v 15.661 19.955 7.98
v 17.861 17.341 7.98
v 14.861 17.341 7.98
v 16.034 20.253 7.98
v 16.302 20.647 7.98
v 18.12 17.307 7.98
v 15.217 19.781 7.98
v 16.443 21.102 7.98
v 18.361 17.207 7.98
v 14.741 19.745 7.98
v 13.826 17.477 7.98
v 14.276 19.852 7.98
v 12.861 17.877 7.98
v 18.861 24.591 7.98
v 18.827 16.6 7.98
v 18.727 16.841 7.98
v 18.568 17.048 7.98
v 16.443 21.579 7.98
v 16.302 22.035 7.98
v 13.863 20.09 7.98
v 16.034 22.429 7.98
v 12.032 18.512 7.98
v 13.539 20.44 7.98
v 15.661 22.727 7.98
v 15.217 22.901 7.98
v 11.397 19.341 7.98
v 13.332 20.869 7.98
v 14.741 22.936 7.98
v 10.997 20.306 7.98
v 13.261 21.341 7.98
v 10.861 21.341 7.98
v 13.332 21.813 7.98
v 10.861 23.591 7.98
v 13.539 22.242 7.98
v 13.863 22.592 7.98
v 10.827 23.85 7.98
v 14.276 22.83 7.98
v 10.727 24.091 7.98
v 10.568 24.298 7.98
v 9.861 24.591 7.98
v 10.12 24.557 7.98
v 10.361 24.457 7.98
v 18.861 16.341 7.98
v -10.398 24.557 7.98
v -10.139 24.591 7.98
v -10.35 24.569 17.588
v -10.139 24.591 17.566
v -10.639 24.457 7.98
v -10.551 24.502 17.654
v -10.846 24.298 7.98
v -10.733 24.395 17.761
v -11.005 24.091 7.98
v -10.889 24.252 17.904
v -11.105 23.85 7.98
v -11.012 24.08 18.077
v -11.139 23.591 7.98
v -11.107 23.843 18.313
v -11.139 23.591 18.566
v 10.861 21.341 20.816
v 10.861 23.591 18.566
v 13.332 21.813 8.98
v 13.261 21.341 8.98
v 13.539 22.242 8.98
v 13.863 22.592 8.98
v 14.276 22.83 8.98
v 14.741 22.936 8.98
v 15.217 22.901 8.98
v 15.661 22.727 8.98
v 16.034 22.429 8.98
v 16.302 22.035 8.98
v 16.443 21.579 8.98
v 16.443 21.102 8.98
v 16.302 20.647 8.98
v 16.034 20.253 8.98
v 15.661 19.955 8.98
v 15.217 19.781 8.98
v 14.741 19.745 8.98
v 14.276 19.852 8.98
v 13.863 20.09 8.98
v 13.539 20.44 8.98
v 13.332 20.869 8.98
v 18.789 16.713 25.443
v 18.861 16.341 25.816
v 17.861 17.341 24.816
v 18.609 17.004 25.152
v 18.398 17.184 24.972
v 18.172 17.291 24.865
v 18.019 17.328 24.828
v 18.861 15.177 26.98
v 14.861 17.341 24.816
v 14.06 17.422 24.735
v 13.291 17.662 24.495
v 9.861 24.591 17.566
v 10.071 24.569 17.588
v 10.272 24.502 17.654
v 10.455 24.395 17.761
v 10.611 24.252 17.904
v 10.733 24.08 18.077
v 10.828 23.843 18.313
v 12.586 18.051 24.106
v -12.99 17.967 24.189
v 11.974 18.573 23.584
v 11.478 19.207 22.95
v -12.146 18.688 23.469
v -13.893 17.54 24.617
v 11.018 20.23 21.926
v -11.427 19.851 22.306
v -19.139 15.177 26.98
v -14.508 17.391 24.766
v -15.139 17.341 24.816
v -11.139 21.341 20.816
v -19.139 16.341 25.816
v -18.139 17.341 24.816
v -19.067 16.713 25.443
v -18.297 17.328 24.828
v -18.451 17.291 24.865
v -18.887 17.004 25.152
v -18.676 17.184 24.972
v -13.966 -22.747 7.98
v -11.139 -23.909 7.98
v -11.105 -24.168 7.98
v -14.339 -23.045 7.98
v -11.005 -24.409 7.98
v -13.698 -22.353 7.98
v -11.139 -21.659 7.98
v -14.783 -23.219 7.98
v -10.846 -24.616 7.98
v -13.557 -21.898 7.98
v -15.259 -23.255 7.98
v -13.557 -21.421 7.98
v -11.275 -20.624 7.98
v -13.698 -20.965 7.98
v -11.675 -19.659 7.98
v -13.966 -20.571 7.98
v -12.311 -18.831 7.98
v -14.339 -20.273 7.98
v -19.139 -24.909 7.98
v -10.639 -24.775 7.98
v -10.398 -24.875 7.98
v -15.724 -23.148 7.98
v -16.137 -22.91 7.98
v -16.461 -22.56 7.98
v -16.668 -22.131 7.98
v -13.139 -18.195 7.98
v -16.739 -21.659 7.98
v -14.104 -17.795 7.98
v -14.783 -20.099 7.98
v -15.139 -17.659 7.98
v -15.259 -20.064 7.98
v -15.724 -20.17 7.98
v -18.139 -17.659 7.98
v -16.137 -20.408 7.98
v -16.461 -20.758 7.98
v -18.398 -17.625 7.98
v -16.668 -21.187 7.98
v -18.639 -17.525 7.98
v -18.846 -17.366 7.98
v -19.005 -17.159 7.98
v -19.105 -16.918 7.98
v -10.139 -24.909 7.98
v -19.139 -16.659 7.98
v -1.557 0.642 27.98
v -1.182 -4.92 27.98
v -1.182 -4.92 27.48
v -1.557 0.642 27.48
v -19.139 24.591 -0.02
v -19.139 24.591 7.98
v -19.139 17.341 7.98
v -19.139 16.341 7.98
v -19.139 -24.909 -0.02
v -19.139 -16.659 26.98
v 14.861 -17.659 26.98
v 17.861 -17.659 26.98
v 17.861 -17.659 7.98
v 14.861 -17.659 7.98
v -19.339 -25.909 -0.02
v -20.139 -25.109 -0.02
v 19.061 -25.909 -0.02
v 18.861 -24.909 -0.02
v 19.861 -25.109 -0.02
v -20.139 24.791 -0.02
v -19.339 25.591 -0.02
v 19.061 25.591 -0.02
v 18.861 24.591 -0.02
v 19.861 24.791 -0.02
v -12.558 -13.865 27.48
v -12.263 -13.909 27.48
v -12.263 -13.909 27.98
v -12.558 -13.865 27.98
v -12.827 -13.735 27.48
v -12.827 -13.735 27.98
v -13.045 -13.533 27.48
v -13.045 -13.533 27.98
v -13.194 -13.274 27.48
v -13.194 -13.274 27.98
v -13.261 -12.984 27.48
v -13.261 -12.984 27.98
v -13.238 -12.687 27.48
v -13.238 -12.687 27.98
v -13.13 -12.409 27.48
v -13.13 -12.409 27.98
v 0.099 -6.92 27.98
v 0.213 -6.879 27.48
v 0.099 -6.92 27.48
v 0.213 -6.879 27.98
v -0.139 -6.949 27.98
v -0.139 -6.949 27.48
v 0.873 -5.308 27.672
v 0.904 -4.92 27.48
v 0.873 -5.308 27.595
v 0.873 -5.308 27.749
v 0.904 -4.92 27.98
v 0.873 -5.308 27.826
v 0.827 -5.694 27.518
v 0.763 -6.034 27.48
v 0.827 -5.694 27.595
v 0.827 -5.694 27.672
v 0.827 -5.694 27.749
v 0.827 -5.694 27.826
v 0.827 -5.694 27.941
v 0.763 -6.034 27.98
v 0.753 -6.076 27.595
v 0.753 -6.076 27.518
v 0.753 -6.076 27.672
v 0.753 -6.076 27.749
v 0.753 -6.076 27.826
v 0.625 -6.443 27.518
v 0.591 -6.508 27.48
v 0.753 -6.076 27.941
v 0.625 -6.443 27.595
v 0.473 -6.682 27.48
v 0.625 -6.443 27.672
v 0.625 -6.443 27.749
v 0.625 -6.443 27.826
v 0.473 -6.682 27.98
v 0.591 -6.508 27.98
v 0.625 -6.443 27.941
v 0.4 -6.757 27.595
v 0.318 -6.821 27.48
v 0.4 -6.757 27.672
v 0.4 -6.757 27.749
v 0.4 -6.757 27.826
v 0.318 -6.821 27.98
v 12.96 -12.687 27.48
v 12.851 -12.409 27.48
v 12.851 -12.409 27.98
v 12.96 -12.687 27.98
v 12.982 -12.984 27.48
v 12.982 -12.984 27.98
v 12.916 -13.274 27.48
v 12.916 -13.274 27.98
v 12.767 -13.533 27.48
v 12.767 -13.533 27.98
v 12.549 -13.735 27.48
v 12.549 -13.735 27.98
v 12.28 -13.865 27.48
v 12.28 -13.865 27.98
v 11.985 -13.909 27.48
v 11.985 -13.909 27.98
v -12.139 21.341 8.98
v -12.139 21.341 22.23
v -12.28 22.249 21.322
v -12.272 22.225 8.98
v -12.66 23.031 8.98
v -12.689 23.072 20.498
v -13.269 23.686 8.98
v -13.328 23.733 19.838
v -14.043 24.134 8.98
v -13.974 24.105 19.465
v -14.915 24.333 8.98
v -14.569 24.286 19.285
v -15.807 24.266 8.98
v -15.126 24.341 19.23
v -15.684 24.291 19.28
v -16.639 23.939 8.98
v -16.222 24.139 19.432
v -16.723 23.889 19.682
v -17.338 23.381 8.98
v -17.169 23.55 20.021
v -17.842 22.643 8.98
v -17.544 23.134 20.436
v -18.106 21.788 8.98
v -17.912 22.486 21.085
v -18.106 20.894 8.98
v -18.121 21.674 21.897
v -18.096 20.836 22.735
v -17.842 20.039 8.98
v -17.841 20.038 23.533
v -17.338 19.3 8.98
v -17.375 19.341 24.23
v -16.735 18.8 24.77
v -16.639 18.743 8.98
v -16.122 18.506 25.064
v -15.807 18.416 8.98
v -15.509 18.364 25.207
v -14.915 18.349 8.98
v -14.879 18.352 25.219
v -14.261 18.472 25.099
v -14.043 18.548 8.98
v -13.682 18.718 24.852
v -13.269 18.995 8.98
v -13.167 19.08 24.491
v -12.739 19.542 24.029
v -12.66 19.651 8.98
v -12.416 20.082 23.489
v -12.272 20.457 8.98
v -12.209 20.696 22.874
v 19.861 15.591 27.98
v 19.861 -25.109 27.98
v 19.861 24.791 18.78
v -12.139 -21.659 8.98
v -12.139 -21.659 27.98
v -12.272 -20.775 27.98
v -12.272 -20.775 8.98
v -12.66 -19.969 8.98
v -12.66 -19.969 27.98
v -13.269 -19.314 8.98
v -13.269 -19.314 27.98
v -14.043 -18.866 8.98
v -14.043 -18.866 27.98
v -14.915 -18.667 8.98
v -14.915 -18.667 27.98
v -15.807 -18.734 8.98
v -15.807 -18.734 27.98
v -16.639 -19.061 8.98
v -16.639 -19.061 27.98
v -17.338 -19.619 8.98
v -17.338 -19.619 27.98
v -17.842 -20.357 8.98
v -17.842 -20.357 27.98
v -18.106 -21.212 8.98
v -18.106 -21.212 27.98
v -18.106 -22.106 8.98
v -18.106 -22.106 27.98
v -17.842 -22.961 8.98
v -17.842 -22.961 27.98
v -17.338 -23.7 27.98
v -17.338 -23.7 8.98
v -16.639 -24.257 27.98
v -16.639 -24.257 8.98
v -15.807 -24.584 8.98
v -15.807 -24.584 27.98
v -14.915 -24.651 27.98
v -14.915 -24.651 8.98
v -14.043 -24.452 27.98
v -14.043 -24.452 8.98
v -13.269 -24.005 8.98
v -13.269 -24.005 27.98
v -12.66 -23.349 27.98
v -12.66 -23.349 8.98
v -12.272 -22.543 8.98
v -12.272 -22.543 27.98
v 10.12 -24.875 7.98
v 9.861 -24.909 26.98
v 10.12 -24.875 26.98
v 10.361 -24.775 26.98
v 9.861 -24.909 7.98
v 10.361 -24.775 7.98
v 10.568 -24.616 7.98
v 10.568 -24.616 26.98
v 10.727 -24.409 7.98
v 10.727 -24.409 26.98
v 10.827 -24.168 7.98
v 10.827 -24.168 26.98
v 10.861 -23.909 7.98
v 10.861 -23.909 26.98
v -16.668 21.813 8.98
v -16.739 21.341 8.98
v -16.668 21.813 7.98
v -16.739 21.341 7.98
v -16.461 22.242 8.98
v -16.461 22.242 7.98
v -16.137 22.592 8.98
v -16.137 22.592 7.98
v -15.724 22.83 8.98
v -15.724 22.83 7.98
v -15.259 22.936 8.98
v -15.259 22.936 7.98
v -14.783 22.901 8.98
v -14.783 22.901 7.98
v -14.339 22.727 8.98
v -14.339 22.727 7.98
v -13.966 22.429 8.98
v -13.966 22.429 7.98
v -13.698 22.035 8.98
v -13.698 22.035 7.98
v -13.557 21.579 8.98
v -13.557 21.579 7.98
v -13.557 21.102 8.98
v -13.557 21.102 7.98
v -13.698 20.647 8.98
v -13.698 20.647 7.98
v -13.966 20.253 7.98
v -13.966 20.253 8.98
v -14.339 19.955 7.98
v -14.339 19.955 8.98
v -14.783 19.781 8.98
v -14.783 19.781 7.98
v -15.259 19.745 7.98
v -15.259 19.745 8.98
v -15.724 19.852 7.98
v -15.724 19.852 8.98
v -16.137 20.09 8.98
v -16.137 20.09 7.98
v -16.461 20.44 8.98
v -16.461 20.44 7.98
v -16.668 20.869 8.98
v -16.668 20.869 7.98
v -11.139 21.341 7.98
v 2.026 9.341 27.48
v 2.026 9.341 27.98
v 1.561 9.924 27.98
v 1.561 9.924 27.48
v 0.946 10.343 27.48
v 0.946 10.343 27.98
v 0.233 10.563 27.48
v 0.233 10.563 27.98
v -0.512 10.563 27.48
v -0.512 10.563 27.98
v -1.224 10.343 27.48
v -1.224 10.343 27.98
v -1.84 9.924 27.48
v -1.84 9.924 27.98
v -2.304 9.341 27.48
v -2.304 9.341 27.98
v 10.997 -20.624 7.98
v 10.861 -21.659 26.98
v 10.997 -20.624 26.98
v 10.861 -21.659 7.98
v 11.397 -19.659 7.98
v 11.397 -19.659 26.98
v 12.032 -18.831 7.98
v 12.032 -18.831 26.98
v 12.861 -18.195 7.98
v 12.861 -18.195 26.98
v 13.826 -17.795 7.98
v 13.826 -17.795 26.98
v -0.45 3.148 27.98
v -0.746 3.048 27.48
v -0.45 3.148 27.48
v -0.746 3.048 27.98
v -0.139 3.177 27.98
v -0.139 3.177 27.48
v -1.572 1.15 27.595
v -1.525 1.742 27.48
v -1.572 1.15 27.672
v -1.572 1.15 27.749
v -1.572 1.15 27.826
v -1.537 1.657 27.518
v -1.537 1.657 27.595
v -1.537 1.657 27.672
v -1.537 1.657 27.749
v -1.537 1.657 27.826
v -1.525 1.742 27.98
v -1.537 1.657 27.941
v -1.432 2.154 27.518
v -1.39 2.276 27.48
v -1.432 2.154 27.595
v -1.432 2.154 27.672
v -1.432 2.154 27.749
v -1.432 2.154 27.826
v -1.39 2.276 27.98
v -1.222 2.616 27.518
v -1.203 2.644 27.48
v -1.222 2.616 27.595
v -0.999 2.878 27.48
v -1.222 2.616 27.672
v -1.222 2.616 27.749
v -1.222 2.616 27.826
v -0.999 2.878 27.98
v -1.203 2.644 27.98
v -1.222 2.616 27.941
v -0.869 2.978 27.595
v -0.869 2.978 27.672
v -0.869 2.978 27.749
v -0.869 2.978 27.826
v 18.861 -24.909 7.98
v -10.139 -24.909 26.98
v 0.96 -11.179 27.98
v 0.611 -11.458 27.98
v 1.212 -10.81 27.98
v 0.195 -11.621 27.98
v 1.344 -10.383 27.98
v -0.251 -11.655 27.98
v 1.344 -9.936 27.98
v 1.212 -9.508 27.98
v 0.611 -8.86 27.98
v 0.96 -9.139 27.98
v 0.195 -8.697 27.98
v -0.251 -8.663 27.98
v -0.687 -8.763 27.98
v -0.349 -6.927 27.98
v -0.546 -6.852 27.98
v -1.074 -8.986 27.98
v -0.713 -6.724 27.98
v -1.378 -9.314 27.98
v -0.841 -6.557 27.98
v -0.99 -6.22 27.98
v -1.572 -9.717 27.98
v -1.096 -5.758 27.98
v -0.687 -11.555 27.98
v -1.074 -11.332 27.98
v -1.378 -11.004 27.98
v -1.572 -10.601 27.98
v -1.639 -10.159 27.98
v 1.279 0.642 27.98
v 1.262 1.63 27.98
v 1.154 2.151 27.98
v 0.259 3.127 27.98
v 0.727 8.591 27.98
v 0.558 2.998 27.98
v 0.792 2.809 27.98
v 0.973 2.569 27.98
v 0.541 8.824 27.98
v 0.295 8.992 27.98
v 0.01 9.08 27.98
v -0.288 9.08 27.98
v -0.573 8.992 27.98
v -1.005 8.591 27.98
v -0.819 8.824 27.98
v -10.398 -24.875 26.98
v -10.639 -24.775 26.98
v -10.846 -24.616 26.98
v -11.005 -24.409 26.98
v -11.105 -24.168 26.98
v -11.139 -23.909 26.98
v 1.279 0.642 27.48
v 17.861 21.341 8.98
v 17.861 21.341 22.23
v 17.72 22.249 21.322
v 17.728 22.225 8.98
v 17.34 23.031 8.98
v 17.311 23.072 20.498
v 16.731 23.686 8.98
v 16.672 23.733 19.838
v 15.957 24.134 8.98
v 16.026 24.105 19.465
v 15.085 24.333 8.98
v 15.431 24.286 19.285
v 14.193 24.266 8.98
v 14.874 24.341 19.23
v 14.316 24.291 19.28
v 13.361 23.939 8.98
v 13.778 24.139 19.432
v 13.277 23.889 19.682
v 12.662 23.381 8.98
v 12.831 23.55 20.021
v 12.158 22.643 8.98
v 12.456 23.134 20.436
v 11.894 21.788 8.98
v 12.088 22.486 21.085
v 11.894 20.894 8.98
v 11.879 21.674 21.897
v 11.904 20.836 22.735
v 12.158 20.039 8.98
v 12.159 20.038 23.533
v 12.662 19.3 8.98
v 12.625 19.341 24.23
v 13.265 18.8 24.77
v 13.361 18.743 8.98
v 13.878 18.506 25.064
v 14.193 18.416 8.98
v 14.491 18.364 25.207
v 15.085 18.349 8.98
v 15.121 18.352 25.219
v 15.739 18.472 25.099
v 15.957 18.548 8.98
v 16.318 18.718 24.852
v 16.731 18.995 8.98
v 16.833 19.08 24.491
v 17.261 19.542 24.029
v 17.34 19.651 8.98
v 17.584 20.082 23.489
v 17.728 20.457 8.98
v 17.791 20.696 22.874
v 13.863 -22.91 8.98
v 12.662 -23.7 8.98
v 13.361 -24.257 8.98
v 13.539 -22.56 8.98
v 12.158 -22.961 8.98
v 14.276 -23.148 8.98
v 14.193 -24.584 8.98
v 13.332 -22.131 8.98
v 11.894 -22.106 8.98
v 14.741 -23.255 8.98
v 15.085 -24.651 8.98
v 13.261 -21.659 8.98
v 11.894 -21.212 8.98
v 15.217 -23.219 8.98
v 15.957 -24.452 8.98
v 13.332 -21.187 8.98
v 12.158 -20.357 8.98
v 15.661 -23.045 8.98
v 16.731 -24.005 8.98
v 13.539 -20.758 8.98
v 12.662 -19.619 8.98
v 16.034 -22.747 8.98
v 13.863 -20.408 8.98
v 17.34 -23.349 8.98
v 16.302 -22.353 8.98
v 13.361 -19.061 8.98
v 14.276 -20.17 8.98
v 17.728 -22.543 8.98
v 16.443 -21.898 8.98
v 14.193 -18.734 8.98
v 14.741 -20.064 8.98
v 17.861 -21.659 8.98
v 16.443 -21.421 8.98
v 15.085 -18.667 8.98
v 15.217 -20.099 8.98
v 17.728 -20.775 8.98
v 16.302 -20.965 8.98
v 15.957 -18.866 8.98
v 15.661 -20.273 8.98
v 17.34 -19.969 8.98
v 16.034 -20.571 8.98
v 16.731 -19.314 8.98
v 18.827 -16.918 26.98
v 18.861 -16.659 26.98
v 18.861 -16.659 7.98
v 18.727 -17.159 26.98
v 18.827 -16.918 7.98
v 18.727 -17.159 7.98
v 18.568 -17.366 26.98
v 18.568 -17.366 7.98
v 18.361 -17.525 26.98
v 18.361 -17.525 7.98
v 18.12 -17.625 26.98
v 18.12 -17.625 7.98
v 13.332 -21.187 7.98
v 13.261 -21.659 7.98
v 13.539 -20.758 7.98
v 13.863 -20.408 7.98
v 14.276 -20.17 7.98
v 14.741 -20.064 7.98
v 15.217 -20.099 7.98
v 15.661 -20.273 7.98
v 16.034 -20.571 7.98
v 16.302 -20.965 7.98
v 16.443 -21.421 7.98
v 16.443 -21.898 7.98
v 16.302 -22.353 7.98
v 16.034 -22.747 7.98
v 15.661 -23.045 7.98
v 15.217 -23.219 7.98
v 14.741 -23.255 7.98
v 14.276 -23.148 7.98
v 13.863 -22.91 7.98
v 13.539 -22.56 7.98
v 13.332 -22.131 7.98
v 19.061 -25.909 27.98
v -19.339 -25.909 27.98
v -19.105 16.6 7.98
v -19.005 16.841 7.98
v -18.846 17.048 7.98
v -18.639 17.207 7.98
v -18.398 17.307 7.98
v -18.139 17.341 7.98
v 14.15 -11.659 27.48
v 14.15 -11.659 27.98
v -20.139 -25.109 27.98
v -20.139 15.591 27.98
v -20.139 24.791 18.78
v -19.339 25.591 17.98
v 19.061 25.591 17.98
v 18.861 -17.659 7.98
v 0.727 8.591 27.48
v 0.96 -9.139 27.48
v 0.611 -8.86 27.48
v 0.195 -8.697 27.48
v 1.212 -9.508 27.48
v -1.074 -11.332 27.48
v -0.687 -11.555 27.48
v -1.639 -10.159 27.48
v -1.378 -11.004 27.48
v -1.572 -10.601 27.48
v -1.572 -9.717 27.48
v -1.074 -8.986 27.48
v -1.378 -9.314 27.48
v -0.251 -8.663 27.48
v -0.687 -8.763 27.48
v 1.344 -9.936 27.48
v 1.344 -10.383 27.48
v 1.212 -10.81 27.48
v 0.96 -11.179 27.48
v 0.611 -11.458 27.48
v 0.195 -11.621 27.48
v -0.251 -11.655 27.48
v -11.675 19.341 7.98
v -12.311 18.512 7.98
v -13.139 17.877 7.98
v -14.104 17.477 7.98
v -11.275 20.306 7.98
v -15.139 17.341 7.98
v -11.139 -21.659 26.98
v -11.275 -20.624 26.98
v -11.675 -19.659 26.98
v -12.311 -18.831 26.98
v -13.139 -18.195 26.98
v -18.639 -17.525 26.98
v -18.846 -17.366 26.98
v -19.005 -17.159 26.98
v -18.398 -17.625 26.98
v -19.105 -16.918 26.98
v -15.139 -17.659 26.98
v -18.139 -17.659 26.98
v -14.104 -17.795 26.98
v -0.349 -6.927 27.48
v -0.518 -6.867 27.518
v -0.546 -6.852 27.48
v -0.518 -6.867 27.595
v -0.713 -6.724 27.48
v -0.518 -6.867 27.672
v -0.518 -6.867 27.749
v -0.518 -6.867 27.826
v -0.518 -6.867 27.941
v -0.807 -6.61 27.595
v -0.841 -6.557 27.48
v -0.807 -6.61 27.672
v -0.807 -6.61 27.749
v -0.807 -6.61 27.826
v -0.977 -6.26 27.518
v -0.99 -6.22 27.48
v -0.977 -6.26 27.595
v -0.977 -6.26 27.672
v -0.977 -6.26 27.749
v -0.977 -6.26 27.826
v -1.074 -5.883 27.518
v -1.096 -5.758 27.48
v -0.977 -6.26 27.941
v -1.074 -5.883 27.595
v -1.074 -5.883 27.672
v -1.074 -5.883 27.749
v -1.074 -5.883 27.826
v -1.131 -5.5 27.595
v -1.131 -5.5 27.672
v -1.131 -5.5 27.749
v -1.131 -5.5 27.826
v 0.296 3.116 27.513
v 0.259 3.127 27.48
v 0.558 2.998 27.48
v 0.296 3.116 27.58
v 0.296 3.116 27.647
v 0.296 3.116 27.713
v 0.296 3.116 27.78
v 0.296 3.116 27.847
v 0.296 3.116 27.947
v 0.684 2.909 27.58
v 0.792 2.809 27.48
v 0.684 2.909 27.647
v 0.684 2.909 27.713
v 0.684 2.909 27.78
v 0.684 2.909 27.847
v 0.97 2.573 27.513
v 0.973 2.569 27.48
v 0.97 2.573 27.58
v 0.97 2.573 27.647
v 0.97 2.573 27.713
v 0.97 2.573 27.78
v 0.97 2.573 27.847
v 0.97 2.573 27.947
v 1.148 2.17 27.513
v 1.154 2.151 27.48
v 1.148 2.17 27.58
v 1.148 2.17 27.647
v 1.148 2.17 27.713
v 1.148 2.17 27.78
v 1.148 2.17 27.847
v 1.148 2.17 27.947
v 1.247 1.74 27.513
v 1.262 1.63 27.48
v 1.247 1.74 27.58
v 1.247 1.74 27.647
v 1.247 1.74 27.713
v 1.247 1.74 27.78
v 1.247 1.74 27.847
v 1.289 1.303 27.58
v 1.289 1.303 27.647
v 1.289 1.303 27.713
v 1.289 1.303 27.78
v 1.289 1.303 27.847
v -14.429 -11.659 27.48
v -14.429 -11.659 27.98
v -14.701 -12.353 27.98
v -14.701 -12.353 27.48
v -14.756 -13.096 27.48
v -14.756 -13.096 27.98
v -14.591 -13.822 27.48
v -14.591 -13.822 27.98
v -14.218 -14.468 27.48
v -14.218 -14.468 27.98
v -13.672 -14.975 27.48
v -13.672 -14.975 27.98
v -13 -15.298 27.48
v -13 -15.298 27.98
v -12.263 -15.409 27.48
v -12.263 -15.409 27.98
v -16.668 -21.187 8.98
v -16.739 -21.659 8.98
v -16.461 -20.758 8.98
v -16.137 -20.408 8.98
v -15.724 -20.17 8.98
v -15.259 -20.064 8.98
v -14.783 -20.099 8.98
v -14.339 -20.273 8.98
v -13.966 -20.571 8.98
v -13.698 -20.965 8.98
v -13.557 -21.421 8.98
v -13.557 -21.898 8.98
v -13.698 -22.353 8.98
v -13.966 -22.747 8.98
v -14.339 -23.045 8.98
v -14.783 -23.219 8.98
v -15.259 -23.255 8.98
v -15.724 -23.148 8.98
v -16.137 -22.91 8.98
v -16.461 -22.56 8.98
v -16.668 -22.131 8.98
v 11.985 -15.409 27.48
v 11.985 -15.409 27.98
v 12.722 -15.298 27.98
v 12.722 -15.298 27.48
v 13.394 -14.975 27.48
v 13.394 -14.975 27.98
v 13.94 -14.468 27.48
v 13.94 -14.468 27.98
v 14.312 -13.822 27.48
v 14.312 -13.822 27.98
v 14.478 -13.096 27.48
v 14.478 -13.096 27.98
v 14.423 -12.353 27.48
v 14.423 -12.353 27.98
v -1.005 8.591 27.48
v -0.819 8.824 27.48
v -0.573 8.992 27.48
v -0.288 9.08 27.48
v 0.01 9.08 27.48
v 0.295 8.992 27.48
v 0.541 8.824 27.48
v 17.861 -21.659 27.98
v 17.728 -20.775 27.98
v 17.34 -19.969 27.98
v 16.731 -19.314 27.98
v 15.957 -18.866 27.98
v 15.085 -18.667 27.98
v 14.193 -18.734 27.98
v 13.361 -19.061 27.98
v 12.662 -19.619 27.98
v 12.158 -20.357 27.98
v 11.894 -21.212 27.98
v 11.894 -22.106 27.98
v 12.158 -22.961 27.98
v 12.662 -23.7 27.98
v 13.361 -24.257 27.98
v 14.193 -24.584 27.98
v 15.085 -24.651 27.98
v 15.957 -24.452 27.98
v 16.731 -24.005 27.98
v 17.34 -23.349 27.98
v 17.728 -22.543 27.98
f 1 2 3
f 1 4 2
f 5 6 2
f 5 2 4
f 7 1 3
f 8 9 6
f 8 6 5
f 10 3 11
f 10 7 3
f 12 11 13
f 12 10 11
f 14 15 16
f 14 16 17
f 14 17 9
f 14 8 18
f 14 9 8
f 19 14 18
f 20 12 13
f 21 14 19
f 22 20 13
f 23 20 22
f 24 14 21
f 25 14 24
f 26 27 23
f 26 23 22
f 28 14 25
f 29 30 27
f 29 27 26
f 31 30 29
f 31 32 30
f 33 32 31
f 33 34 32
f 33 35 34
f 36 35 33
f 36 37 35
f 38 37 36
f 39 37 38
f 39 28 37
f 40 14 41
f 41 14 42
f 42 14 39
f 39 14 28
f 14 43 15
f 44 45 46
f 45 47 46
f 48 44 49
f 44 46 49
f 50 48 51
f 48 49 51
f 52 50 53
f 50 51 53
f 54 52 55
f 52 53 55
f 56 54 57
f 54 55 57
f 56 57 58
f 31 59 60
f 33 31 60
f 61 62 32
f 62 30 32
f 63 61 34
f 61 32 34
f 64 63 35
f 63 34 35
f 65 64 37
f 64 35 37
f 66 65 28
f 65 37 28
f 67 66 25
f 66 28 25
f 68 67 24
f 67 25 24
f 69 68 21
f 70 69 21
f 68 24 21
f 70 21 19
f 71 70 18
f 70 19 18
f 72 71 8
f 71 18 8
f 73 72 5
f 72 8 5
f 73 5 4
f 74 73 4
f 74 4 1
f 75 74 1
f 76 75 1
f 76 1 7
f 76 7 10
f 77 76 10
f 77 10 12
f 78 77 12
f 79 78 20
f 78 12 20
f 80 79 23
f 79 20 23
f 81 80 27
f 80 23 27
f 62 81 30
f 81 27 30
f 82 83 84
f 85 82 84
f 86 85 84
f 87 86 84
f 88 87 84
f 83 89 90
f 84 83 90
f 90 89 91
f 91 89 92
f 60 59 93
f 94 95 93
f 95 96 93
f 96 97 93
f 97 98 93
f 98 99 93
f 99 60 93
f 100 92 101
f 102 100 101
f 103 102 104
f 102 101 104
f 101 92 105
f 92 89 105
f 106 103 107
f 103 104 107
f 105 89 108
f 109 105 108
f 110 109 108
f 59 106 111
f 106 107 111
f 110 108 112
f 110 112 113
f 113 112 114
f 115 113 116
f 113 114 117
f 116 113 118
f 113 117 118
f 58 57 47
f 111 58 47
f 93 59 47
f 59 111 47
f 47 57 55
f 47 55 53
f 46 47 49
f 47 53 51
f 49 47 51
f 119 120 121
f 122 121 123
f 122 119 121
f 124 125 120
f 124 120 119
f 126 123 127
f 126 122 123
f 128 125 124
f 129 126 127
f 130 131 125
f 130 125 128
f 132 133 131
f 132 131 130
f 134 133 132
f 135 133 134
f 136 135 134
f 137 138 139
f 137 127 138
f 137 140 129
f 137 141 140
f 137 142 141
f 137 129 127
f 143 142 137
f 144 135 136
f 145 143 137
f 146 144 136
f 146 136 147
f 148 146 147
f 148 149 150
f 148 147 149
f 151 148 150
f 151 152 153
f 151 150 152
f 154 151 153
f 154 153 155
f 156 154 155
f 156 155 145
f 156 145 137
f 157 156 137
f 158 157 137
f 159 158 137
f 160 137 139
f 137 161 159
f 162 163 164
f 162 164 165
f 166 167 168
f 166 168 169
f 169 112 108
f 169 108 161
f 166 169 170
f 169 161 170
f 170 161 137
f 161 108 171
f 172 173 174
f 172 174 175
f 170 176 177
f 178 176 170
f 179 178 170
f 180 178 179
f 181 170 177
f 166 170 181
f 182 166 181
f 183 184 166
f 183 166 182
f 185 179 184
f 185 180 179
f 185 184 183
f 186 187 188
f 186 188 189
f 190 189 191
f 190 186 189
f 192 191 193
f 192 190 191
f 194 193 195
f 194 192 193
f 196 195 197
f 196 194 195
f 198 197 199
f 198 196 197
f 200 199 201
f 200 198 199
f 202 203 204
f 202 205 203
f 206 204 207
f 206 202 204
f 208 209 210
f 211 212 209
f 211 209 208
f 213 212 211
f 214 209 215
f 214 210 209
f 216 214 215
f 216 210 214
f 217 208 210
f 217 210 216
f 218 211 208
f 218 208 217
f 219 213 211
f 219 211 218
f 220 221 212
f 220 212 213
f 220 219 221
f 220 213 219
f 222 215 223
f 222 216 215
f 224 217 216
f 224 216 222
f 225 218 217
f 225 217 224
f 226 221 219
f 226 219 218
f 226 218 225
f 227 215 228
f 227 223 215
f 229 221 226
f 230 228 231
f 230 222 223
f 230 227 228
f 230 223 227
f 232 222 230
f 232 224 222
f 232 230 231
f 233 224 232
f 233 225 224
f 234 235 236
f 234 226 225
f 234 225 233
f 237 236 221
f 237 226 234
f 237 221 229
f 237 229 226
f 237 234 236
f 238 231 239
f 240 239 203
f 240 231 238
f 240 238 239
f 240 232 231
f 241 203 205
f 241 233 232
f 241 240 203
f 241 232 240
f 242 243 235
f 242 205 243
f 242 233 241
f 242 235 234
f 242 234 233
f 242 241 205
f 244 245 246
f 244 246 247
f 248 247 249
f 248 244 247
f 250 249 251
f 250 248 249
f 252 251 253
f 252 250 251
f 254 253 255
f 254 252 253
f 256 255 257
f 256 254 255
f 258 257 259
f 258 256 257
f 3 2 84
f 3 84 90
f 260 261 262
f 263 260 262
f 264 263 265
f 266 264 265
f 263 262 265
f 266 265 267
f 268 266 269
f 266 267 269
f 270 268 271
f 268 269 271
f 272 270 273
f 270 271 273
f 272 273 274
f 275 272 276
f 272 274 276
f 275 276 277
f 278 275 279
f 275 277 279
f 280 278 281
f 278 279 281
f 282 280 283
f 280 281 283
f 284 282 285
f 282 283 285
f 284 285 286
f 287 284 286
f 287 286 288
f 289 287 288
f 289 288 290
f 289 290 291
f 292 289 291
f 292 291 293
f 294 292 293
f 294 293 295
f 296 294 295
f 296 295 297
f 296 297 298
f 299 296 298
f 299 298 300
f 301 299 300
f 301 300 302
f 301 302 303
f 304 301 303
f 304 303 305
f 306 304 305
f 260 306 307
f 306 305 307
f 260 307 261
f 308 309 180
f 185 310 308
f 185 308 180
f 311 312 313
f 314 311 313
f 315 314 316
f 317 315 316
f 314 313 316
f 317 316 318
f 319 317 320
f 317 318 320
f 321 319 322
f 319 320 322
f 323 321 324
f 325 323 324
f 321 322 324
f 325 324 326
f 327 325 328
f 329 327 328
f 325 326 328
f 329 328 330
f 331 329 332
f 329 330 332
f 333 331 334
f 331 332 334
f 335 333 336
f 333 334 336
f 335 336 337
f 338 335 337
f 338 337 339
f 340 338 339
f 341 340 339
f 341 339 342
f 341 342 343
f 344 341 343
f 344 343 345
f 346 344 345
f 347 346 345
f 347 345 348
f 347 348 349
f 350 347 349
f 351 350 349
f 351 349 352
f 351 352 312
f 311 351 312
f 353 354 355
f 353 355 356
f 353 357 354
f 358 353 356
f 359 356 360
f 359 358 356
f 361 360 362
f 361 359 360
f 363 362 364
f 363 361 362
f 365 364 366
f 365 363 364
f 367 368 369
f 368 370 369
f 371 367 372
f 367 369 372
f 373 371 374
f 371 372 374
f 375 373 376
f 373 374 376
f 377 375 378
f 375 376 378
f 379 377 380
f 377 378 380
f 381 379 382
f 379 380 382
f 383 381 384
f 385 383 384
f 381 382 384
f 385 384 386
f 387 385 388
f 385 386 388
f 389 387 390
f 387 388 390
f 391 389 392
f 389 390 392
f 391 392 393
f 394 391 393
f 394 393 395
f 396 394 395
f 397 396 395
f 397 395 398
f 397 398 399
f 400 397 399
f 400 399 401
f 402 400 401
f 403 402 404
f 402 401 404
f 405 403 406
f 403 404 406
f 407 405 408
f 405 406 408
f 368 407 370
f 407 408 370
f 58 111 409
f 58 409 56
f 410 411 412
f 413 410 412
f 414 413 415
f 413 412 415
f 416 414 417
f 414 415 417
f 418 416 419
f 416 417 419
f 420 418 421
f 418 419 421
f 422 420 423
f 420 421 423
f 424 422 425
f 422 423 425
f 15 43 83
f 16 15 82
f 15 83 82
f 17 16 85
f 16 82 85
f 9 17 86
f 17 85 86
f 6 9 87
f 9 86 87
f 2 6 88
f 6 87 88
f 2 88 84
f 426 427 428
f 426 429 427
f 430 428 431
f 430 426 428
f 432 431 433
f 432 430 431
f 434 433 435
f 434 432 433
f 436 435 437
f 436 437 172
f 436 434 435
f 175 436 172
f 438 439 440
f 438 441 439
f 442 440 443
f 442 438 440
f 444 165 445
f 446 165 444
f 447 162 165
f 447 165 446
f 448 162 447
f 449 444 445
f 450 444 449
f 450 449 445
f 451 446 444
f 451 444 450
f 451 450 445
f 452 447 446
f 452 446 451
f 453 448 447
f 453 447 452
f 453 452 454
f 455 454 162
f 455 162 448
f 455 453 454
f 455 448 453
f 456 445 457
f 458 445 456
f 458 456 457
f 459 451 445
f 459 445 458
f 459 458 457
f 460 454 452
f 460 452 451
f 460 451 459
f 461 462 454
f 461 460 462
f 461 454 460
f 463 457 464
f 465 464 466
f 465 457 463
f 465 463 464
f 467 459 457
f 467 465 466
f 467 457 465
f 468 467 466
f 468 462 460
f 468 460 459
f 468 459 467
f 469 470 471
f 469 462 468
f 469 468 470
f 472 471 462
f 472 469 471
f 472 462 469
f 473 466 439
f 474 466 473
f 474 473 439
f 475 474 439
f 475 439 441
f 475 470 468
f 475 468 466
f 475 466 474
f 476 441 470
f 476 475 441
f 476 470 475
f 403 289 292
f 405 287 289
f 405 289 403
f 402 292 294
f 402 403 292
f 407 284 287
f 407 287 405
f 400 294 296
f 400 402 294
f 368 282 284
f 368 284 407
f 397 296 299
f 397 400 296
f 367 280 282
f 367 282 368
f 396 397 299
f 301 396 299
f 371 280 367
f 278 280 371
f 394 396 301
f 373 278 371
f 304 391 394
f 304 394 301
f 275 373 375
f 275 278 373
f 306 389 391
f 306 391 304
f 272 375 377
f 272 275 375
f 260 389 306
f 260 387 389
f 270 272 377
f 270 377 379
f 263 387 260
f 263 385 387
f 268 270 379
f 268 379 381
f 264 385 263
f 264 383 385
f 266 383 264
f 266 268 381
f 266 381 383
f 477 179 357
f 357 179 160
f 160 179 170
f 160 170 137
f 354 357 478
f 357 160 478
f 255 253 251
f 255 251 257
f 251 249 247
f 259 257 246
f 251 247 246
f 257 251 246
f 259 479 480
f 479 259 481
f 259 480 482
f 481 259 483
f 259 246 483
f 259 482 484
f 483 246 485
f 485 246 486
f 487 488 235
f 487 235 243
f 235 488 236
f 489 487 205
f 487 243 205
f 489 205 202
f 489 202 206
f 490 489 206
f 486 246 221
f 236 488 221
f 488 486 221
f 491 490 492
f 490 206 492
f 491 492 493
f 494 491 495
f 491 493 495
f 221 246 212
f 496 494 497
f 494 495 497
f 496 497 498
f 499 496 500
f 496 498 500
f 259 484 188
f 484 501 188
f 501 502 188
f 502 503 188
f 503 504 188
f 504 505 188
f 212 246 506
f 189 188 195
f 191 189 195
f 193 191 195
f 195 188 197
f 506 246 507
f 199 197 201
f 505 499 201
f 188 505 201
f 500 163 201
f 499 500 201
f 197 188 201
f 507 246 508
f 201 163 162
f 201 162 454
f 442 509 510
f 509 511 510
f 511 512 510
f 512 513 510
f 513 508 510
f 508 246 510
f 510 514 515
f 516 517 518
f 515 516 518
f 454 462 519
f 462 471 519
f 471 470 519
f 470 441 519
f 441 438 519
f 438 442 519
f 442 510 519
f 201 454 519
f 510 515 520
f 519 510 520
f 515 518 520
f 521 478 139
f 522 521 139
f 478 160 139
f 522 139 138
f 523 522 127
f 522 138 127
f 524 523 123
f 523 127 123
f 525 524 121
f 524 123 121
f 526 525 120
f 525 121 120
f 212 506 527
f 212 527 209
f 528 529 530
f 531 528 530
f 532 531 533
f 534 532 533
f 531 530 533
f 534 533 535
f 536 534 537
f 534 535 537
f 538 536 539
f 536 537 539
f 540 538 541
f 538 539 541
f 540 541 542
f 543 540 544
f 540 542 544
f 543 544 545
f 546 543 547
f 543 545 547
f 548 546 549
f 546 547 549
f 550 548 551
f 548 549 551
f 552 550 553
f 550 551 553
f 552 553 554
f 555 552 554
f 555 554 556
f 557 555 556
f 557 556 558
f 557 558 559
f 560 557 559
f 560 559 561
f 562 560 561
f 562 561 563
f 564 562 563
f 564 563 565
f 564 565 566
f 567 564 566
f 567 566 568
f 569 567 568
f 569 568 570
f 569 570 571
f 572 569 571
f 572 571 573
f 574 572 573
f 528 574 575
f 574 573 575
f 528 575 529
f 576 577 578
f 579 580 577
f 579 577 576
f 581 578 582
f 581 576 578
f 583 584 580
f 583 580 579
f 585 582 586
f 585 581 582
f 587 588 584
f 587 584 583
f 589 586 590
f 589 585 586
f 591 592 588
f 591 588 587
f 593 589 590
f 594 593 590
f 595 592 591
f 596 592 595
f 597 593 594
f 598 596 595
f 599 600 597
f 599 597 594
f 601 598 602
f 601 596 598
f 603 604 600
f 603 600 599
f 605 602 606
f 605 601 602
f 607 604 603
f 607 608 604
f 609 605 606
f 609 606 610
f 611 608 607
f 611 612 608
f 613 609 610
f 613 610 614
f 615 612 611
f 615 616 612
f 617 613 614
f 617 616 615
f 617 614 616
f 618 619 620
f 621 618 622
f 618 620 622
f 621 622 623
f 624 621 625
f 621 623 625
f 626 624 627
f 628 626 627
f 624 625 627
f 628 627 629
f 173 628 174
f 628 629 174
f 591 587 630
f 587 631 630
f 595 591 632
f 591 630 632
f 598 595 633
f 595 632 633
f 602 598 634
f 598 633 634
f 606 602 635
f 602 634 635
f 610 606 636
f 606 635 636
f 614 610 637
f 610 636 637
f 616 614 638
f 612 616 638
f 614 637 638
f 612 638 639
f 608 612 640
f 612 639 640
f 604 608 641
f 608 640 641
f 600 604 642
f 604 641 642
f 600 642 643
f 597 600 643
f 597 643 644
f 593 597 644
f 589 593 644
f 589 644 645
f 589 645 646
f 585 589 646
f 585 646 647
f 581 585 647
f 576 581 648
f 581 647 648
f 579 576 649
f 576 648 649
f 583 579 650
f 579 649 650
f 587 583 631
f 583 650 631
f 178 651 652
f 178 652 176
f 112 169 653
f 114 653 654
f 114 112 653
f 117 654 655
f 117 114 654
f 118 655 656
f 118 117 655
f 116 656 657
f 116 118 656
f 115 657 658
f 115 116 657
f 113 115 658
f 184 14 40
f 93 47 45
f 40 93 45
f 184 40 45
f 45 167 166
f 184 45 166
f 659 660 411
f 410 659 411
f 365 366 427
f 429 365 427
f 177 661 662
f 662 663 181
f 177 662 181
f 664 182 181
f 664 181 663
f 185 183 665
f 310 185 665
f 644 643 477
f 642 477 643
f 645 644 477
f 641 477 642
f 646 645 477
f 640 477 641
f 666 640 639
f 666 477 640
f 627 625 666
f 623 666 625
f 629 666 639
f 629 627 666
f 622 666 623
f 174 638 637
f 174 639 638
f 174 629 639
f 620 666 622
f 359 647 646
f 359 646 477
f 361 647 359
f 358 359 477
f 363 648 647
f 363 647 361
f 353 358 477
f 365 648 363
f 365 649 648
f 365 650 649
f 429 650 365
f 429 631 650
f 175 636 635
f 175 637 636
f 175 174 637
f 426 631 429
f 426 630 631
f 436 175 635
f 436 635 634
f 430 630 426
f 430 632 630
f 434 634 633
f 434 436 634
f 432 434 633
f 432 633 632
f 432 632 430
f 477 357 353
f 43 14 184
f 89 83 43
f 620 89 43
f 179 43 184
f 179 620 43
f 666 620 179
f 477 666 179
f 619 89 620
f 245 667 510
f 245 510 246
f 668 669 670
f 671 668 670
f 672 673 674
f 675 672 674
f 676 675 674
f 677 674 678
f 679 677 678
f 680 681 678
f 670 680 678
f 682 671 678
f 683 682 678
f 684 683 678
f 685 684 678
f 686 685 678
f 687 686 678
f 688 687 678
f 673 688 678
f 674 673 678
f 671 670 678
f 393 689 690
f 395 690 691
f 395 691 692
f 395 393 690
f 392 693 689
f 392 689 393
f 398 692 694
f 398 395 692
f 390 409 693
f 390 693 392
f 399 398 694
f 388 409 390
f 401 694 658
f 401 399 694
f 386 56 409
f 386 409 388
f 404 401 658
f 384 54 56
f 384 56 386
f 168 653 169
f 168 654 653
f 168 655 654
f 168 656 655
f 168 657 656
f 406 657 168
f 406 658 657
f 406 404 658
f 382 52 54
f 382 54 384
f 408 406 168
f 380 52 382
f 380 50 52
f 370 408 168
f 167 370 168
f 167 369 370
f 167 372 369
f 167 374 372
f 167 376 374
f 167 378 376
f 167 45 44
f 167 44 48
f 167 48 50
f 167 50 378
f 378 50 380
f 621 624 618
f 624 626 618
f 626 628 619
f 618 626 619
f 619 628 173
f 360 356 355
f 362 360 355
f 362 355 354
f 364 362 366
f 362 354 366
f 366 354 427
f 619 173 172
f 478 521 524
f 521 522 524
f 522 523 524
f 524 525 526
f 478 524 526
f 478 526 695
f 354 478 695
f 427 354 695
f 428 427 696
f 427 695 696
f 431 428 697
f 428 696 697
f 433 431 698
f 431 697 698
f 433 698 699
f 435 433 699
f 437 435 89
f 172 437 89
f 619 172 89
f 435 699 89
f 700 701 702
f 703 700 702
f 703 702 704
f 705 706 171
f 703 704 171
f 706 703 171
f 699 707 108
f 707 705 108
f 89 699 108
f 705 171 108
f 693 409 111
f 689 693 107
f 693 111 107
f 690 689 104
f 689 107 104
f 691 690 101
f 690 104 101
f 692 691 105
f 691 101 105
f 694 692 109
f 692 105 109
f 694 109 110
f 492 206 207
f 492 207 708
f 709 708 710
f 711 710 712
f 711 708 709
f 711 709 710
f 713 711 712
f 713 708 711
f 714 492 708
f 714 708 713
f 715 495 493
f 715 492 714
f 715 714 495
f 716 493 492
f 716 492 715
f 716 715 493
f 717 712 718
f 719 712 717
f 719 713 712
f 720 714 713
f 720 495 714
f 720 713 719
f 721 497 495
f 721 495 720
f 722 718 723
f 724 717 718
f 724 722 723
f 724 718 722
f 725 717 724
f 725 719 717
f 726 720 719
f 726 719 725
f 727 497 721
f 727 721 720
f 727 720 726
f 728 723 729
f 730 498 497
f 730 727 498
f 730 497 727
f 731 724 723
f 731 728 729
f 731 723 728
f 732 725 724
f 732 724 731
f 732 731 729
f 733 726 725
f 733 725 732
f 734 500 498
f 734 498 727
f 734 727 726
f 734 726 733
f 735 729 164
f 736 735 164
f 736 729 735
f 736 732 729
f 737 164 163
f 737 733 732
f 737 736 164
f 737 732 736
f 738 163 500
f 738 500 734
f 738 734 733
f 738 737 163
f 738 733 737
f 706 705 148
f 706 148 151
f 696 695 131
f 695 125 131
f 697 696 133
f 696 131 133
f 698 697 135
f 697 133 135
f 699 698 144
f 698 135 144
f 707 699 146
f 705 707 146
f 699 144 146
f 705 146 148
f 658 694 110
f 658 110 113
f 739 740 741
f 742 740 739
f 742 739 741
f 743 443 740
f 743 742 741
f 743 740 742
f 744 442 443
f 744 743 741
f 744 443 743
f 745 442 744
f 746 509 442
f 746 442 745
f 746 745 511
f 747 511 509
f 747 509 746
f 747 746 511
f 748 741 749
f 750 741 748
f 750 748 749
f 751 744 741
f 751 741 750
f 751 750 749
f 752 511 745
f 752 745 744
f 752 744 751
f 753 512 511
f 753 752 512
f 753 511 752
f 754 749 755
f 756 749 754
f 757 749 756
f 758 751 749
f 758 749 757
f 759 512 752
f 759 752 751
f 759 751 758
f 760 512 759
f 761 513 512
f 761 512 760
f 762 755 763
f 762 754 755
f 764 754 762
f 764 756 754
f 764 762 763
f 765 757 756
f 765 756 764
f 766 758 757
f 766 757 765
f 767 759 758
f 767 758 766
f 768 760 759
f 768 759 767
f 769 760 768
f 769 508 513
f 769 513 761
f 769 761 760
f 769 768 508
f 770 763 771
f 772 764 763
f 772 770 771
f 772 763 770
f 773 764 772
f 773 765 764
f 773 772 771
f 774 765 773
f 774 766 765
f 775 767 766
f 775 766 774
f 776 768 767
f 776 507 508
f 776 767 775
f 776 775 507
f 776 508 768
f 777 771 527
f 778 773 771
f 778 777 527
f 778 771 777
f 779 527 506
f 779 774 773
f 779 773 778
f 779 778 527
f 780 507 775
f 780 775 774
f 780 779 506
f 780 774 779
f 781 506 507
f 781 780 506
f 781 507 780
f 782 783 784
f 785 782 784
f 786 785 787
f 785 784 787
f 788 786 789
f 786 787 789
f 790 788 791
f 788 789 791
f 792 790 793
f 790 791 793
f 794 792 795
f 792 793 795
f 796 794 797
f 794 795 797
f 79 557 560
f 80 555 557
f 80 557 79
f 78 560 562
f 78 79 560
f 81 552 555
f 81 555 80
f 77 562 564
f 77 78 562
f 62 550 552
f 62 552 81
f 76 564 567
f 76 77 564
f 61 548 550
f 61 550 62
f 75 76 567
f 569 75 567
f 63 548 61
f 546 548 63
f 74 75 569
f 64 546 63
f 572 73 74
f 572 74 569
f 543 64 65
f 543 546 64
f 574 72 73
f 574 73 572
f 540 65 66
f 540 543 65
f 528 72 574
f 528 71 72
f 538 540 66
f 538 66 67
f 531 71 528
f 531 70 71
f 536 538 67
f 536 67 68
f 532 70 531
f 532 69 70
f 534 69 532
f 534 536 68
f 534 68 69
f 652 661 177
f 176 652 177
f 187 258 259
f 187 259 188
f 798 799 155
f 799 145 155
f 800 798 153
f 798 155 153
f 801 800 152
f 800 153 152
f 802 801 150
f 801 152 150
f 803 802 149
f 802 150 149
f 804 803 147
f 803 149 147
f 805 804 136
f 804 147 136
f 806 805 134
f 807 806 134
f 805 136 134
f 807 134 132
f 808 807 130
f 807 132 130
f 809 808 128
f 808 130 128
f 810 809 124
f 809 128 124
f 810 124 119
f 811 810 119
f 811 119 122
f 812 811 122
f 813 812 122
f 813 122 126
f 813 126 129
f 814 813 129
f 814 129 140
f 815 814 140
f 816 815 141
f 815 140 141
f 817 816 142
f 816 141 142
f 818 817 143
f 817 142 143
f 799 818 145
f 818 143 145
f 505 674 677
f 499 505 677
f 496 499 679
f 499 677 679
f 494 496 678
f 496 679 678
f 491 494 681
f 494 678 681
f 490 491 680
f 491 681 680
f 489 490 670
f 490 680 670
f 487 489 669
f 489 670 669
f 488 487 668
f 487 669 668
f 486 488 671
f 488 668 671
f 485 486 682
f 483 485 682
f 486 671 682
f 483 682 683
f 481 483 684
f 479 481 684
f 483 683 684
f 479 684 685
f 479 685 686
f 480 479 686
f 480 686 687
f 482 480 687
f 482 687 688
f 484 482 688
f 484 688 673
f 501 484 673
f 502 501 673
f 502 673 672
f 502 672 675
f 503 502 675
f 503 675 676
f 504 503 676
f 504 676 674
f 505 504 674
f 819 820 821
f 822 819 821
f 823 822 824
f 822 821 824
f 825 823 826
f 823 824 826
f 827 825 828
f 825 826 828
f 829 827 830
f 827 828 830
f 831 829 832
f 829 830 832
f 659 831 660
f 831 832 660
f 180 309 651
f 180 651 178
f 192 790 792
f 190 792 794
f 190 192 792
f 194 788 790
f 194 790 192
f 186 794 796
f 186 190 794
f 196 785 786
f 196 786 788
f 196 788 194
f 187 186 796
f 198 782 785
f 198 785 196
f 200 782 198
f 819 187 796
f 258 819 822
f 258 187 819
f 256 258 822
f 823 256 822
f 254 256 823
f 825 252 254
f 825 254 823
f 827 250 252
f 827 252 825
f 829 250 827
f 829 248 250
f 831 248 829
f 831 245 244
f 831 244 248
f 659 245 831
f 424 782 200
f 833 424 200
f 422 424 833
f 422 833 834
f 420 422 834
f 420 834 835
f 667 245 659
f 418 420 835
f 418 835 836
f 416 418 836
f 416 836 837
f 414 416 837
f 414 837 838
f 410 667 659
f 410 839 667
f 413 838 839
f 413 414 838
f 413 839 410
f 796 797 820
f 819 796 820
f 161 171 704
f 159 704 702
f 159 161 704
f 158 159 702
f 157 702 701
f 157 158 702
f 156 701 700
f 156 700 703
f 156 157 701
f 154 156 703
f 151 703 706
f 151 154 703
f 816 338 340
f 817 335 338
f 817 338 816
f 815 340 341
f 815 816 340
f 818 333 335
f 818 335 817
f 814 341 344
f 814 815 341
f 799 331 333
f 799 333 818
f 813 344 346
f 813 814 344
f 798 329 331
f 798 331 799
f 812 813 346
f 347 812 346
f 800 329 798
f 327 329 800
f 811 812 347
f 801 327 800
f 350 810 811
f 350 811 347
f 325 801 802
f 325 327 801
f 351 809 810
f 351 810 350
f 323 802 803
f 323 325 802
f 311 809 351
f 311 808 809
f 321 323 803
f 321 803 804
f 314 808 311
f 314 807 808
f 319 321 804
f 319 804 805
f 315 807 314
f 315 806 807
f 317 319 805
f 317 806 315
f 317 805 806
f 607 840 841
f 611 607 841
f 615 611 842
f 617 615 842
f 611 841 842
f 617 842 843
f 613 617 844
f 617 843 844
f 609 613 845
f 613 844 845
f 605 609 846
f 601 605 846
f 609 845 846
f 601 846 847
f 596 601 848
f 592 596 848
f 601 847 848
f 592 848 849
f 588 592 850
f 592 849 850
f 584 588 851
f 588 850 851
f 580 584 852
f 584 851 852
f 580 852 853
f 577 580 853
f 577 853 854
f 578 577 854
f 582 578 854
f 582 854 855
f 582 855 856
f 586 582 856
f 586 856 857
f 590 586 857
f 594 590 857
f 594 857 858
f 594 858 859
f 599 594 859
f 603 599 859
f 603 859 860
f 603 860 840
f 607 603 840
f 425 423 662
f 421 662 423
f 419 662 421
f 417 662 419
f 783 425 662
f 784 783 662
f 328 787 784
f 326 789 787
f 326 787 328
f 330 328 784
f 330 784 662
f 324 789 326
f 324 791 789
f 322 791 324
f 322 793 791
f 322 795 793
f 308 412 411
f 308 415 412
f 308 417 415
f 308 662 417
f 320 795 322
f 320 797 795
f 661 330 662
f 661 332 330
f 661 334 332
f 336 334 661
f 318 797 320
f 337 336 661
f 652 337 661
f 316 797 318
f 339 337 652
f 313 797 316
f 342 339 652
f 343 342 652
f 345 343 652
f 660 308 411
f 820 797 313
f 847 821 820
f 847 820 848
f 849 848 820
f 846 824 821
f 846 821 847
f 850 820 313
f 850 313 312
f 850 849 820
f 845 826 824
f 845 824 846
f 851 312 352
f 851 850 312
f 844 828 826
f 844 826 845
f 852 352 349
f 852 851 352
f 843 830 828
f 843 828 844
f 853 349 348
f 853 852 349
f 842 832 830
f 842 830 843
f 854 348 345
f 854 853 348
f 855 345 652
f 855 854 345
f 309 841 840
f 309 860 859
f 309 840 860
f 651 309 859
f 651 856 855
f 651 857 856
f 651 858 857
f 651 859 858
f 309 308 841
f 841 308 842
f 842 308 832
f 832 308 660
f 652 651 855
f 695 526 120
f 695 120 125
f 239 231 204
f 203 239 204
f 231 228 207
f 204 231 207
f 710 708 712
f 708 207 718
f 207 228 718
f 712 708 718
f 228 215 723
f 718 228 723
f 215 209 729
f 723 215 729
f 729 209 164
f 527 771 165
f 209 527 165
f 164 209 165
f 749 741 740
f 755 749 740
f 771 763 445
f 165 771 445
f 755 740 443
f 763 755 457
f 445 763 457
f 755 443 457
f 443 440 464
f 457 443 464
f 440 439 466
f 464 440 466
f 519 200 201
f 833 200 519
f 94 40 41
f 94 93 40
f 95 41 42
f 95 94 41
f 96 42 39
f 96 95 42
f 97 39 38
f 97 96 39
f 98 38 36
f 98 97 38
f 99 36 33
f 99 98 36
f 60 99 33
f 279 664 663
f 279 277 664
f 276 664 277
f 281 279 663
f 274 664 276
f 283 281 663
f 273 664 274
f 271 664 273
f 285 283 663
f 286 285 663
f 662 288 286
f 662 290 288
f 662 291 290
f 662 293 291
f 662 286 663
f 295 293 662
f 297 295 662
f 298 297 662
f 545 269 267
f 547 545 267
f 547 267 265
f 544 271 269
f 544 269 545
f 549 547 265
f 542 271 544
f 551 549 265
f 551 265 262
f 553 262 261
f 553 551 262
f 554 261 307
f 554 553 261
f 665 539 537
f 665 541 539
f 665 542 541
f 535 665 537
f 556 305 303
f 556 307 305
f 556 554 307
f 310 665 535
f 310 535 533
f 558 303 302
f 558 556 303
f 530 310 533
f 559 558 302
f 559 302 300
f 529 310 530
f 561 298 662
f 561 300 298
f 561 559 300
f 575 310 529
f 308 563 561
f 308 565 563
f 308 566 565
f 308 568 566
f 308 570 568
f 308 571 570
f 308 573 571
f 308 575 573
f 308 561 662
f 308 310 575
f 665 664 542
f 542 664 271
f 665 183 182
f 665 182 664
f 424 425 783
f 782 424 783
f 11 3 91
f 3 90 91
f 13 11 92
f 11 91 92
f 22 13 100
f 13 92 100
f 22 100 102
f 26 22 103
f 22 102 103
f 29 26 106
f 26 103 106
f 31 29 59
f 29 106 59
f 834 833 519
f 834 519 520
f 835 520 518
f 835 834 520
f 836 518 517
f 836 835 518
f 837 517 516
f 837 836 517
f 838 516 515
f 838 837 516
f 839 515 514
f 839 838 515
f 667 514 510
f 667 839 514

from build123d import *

# Parameters (mm, degrees)
BOSS_EXTRUDE1_DEPTH                                 = 40
CUT_EXTRUDE1_DEPTH                                  = 38
BOSS_EXTRUDE2_REACH                                 = 22
SKETCH6_W                                           = 7.999999469
SKETCH6_H                                           = 7.25
BOSS_EXTRUDE3_REACH                                 = 22
SKETCH7_W                                           = 7.999999468
SKETCH7_H                                           = 7.25
SKETCH8_W                                           = 7.999999727
SKETCH8_H                                           = 7.25
BOSS_EXTRUDE4_DEPTH                                 = 19
SKETCH9_W                                           = 7.999999728
SKETCH9_H                                           = 7.25
BOSS_EXTRUDE5_DEPTH                                 = 19
CUT_EXTRUDE4_DEPTH                                  = 0.5
BOSS_EXTRUDE6_DEPTH                                 = 0.5
CUT_EXTRUDE5_START                                  = 1.500005
CUT_EXTRUDE5_DEPTH                                  = 0.5
F_3_CLEARANCE_HOLE1_D                               = 3
F_3_CLEARANCE_HOLE1_DEPTH                           = 0.5
CBORE_FOR_4_BINDING_HEAD_MACHINE_SCREW1_D           = 3.2
CBORE_FOR_4_BINDING_HEAD_MACHINE_SCREW1_DEPTH       = 28
CBORE_FOR_4_BINDING_HEAD_MACHINE_SCREW1_CBORE_D     = 6
CBORE_FOR_4_BINDING_HEAD_MACHINE_SCREW1_CBORE_DEPTH = 19.000000001
CBORE_FOR_4_BINDING_HEAD_MACHINE_SCREW2_D           = 3.2
CBORE_FOR_4_BINDING_HEAD_MACHINE_SCREW2_DEPTH       = 25.25
CBORE_FOR_4_BINDING_HEAD_MACHINE_SCREW2_CBORE_D     = 6
CBORE_FOR_4_BINDING_HEAD_MACHINE_SCREW2_CBORE_DEPTH = 16.250000001
CHAMFER2_SIZE                                       = 0.8
FILLET1_R                                           = 1
FILLET2_R                                           = 4


with BuildPart() as part:
    # Sketch1 → Boss-Extrude1 (new body)
    with BuildSketch(Plane(origin=(19.860869514, 0, 0), x_dir=(0, 0, -1), z_dir=(1, 0, 0))):
        Polygon((0.020116779, -25.909092826), (0.020116779, 25.590907174), (-17.979883221, 25.590907174), (-27.979883221, 15.590907174), (-27.979883221, -25.909092826), align=None)
    extrude(amount=-BOSS_EXTRUDE1_DEPTH)

    # Sketch2 → Cut-Extrude1 (cut)
    with BuildSketch(Plane(origin=(-19.139130486, 0, 0), x_dir=(0, -1, 0), z_dir=(-1, 0, 0))):
        Polygon((-24.590907174, 17.565669658), (-24.590907174, -0.020116779), (24.909092826, -0.020116779), (24.909092826, 26.979883221), (-15.176693611, 26.979883221), align=None)
    extrude(amount=-CUT_EXTRUDE1_DEPTH, mode=Mode.SUBTRACT)

    # Sketch6 → Boss-Extrude2 (add, up to next)
    with BuildSketch(Plane(origin=(0, 0, 7.979883221), x_dir=(-1, 0, 0), z_dir=(0, 0, -1)), mode=Mode.PRIVATE) as boss_extrude2_sk1:
        with Locations((15.139130752, 20.965907174)):
            Rectangle(SKETCH6_W, SKETCH6_H)
    boss_extrude2_tool1 = extrude(boss_extrude2_sk1.sketch, amount=-BOSS_EXTRUDE2_REACH, mode=Mode.PRIVATE) - part.part
    add(boss_extrude2_tool1.solids().sort_by_distance((-15.139131, 20.965907, 7.979883))[0])

    # Sketch7 → Boss-Extrude3 (add, up to next)
    with BuildSketch(Plane(origin=(0, 0, 7.979883221), x_dir=(-1, 0, 0), z_dir=(0, 0, -1)), mode=Mode.PRIVATE) as boss_extrude3_sk1:
        with Locations((-14.86086978, 20.965907174)):
            Rectangle(SKETCH7_W, SKETCH7_H)
    boss_extrude3_tool1 = extrude(boss_extrude3_sk1.sketch, amount=-BOSS_EXTRUDE3_REACH, mode=Mode.PRIVATE) - part.part
    add(boss_extrude3_tool1.solids().sort_by_distance((14.86087, 20.965907, 7.979883))[0])

    # Sketch8 → Boss-Extrude4 (add)
    with BuildSketch(Plane(origin=(0, 0, 26.979883221), x_dir=(-1, 0, 0), z_dir=(0, 0, -1))):
        with Locations((-14.86086965, -21.284092826)):
            Rectangle(SKETCH8_W, SKETCH8_H)
    extrude(amount=BOSS_EXTRUDE4_DEPTH)

    # Sketch9 → Boss-Extrude5 (add)
    with BuildSketch(Plane(origin=(0, 0, 26.979883221), x_dir=(-1, 0, 0), z_dir=(0, 0, -1))):
        with Locations((15.139130622, -21.284092826)):
            Rectangle(SKETCH9_W, SKETCH9_H)
    extrude(amount=BOSS_EXTRUDE5_DEPTH)

    # Sketch10 → Cut-Extrude4 (cut)
    with BuildSketch(Plane.XY.offset(27.979883221)):
        with BuildLine():
            Line((14.150288676, -11.659092827), (2.025933023, 9.340907173))
            ThreePointArc((2.025933023, 9.340907173), (-0.139130487, 10.590907173), (-2.304193997, 9.340907173))
            Line((-2.304193997, 9.340907173), (-14.42854965, -11.659092827))
            ThreePointArc((-14.42854965, -11.659092827), (-14.42854965, -14.159092826), (-12.263486141, -15.409092826))
            Line((-12.263486141, -15.409092826), (11.985225167, -15.409092826))
            ThreePointArc((11.985225167, -15.409092826), (14.150288676, -14.159092826), (14.150288676, -11.659092827))
        make_face()
    extrude(amount=-CUT_EXTRUDE4_DEPTH, mode=Mode.SUBTRACT)

    # Sketch11 → Boss-Extrude6 (add)
    with BuildSketch(Plane.XY.offset(27.479883221)):
        with BuildLine():
            Line((-13.129511542, -12.409092827), (-1.005155889, 8.590907173))
            ThreePointArc((-1.005155889, 8.590907173), (-0.139130485, 9.090907174), (0.72689492, 8.590907173))
            Line((0.72689492, 8.590907173), (12.851250572, -12.409092827))
            ThreePointArc((12.851250572, -12.409092827), (12.851250572, -13.409092827), (11.985225169, -13.909092826))
            Line((11.985225169, -13.909092826), (-12.263486138, -13.909092826))
            ThreePointArc((-12.263486138, -13.909092826), (-13.129511542, -13.409092827), (-13.129511542, -12.409092827))
        make_face()
    extrude(amount=BOSS_EXTRUDE6_DEPTH)

    # Sketch12 → Cut-Extrude5 (cut)
    with BuildSketch(Plane.XY.offset(26.479878344).offset(CUT_EXTRUDE5_START)):
        with BuildLine():
            Line((-1.181805728, -4.919953815), (-1.557388601, 0.642194436))
            add(Edge.make_bspline(
                [(-1.557388601, 0.642194436), (-1.562255195, 0.726894151), (-1.57197876, 0.896126108), (-1.573630596, 1.150381332), (-1.563491274, 1.404367732), (-1.539477279, 1.657492298), (-1.498601615, 1.908446588), (-1.435950641, 2.155034423), (-1.347824447, 2.394209038), (-1.227947002, 2.620066875), (-1.070203444, 2.821498256), (-0.873757735, 2.98640743), (-0.644495445, 3.100925878), (-0.395458992, 3.166647074), (-0.224777297, 3.173588668), (-0.139130486, 3.177071908)],
                knots=[0, 0, 0, 0, 0.076934304, 0.153716488, 0.230489845, 0.307379808, 0.384178278, 0.460861998, 0.537777924, 0.614835636, 0.691825929, 0.768406055, 0.845421183, 0.922433493, 1, 1, 1, 1], degree=3))
            add(Edge.make_bspline(
                [(-0.139130486, 3.177071908), (-0.065510928, 3.174528216), (0.081440904, 3.169450757), (0.298073955, 3.121720242), (0.503386356, 3.037662683), (0.688981961, 2.914531923), (0.846742946, 2.757270627), (0.974882351, 2.575723676), (1.075136008, 2.378059028), (1.151690203, 2.170509138), (1.208454116, 1.957026535), (1.248786563, 1.740308946), (1.275266584, 1.522162803), (1.290343043, 1.303017743), (1.295405911, 1.083047008), (1.292059183, 0.862557831), (1.283440251, 0.71568476), (1.279127629, 0.642194436)],
                knots=[0, 0, 0, 0, 0.06668985, 0.133119456, 0.199920485, 0.266795101, 0.333669142, 0.400733876, 0.467442387, 0.534072191, 0.600968136, 0.667508068, 0.733796294, 0.800115594, 0.866606751, 0.933254524, 1, 1, 1, 1], degree=3))
            Line((1.279127629, 0.642194436), (0.903544756, -4.919953815))
            add(Edge.make_bspline(
                [(0.903544756, -4.919953815), (0.899040298, -4.98465678), (0.890033529, -5.114031861), (0.87358409, -5.307836112), (0.853415093, -5.501287734), (0.828449527, -5.694285405), (0.796710241, -5.88637973), (0.754944033, -6.076605831), (0.700731594, -6.263716972), (0.628895269, -6.444933688), (0.532938656, -6.614900625), (0.405346695, -6.763808252), (0.243240213, -6.874664069), (0.056441287, -6.938986541), (-0.073726294, -6.945537445), (-0.139130486, -6.948829022)],
                knots=[0, 0, 0, 0, 0.076936874, 0.153837066, 0.230708206, 0.307638675, 0.384651809, 0.461589354, 0.538534726, 0.615507305, 0.692327105, 0.769110055, 0.845963233, 0.922602462, 1, 1, 1, 1], degree=3))
            add(Edge.make_bspline(
                [(-0.139130486, -6.948829022), (-0.204192465, -6.945646156), (-0.334523872, -6.939270276), (-0.52166752, -6.874698808), (-0.684560534, -6.763099851), (-0.812386409, -6.613205645), (-0.908338892, -6.442461666), (-0.98006333, -6.260618976), (-1.034024433, -6.073329831), (-1.075624515, -5.883322576), (-1.107062911, -5.691940143), (-1.131842025, -5.499751942), (-1.151924163, -5.306932214), (-1.168322738, -5.113609534), (-1.177310111, -4.984524213), (-1.181805728, -4.919953815)],
                knots=[0, 0, 0, 0, 0.076983897, 0.154213255, 0.231303489, 0.308508561, 0.385703214, 0.462682138, 0.539884122, 0.61667812, 0.693280216, 0.76986989, 0.846510018, 0.923222027, 1, 1, 1, 1], degree=3))
        make_face()
    extrude(amount=-CUT_EXTRUDE5_DEPTH, mode=Mode.SUBTRACT)

    # #3 Clearance Hole1
    with Locations(Plane.XY.offset(27.979883221)):
        with Locations((-0.139130486, -10.159092826)):
            Hole(F_3_CLEARANCE_HOLE1_D / 2, depth=F_3_CLEARANCE_HOLE1_DEPTH)

    # CBORE for #4 Binding Head Machine Screw1
    with Locations(Plane.XY.offset(27.979883221)):
        with Locations((14.860869787, -21.659092826), (-15.139130758, -21.659092826)):
            CounterBoreHole(CBORE_FOR_4_BINDING_HEAD_MACHINE_SCREW1_D / 2, CBORE_FOR_4_BINDING_HEAD_MACHINE_SCREW1_CBORE_D / 2, CBORE_FOR_4_BINDING_HEAD_MACHINE_SCREW1_CBORE_DEPTH, depth=CBORE_FOR_4_BINDING_HEAD_MACHINE_SCREW1_DEPTH)

    # CBORE for #4 Binding Head Machine Screw2
    with Locations(Plane.XY.offset(25.229883221)):
        with Locations((-15.139131017, 21.340907174), (14.860870046, 21.340907174)):
            CounterBoreHole(CBORE_FOR_4_BINDING_HEAD_MACHINE_SCREW2_D / 2, CBORE_FOR_4_BINDING_HEAD_MACHINE_SCREW2_CBORE_D / 2, CBORE_FOR_4_BINDING_HEAD_MACHINE_SCREW2_CBORE_DEPTH, depth=CBORE_FOR_4_BINDING_HEAD_MACHINE_SCREW2_DEPTH)

    # Chamfer2
    chamfer2_edges = [part.edges().sort_by_distance(p)[0] for p in [
        (-20.139130486, 25.590907174, 8.979883221),
        (-20.139130486, -25.909092826, 13.979883221),
        (19.860869514, 25.590907174, 8.979883221),
        (19.860869514, -25.909092826, 13.979883221),
    ]]
    chamfer(chamfer2_edges, length=CHAMFER2_SIZE)

    # Fillet1
    fillet1_edges = [part.edges().sort_by_distance(p)[0] for p in [
        (-11.139131017, 24.590907174, 12.77277644),
        (-19.139130486, 17.340907174, 16.39777644),
        (10.860870046, 24.590907174, 12.77277644),
        (18.860869514, 17.340907174, 16.39777644),
        (10.860869787, -24.909092826, 17.479883221),
        (18.860869514, -17.659092826, 17.479883221),
        (-19.139130486, -17.659092826, 17.479883221),
        (-11.139130758, -24.909092826, 17.479883221),
    ]]
    fillet(fillet1_edges, radius=FILLET1_R)

    # Fillet2
    fillet2_edges = [part.edges().sort_by_distance(p)[0] for p in [
        (-11.139131017, 17.340907174, 16.39777644),
        (10.860870046, 17.340907174, 16.39777644),
        (10.860869787, -17.659092826, 17.479883221),
        (-11.139130758, -17.659092826, 17.479883221),
    ]]
    fillet(fillet2_edges, radius=FILLET2_R)


solid = part.part
